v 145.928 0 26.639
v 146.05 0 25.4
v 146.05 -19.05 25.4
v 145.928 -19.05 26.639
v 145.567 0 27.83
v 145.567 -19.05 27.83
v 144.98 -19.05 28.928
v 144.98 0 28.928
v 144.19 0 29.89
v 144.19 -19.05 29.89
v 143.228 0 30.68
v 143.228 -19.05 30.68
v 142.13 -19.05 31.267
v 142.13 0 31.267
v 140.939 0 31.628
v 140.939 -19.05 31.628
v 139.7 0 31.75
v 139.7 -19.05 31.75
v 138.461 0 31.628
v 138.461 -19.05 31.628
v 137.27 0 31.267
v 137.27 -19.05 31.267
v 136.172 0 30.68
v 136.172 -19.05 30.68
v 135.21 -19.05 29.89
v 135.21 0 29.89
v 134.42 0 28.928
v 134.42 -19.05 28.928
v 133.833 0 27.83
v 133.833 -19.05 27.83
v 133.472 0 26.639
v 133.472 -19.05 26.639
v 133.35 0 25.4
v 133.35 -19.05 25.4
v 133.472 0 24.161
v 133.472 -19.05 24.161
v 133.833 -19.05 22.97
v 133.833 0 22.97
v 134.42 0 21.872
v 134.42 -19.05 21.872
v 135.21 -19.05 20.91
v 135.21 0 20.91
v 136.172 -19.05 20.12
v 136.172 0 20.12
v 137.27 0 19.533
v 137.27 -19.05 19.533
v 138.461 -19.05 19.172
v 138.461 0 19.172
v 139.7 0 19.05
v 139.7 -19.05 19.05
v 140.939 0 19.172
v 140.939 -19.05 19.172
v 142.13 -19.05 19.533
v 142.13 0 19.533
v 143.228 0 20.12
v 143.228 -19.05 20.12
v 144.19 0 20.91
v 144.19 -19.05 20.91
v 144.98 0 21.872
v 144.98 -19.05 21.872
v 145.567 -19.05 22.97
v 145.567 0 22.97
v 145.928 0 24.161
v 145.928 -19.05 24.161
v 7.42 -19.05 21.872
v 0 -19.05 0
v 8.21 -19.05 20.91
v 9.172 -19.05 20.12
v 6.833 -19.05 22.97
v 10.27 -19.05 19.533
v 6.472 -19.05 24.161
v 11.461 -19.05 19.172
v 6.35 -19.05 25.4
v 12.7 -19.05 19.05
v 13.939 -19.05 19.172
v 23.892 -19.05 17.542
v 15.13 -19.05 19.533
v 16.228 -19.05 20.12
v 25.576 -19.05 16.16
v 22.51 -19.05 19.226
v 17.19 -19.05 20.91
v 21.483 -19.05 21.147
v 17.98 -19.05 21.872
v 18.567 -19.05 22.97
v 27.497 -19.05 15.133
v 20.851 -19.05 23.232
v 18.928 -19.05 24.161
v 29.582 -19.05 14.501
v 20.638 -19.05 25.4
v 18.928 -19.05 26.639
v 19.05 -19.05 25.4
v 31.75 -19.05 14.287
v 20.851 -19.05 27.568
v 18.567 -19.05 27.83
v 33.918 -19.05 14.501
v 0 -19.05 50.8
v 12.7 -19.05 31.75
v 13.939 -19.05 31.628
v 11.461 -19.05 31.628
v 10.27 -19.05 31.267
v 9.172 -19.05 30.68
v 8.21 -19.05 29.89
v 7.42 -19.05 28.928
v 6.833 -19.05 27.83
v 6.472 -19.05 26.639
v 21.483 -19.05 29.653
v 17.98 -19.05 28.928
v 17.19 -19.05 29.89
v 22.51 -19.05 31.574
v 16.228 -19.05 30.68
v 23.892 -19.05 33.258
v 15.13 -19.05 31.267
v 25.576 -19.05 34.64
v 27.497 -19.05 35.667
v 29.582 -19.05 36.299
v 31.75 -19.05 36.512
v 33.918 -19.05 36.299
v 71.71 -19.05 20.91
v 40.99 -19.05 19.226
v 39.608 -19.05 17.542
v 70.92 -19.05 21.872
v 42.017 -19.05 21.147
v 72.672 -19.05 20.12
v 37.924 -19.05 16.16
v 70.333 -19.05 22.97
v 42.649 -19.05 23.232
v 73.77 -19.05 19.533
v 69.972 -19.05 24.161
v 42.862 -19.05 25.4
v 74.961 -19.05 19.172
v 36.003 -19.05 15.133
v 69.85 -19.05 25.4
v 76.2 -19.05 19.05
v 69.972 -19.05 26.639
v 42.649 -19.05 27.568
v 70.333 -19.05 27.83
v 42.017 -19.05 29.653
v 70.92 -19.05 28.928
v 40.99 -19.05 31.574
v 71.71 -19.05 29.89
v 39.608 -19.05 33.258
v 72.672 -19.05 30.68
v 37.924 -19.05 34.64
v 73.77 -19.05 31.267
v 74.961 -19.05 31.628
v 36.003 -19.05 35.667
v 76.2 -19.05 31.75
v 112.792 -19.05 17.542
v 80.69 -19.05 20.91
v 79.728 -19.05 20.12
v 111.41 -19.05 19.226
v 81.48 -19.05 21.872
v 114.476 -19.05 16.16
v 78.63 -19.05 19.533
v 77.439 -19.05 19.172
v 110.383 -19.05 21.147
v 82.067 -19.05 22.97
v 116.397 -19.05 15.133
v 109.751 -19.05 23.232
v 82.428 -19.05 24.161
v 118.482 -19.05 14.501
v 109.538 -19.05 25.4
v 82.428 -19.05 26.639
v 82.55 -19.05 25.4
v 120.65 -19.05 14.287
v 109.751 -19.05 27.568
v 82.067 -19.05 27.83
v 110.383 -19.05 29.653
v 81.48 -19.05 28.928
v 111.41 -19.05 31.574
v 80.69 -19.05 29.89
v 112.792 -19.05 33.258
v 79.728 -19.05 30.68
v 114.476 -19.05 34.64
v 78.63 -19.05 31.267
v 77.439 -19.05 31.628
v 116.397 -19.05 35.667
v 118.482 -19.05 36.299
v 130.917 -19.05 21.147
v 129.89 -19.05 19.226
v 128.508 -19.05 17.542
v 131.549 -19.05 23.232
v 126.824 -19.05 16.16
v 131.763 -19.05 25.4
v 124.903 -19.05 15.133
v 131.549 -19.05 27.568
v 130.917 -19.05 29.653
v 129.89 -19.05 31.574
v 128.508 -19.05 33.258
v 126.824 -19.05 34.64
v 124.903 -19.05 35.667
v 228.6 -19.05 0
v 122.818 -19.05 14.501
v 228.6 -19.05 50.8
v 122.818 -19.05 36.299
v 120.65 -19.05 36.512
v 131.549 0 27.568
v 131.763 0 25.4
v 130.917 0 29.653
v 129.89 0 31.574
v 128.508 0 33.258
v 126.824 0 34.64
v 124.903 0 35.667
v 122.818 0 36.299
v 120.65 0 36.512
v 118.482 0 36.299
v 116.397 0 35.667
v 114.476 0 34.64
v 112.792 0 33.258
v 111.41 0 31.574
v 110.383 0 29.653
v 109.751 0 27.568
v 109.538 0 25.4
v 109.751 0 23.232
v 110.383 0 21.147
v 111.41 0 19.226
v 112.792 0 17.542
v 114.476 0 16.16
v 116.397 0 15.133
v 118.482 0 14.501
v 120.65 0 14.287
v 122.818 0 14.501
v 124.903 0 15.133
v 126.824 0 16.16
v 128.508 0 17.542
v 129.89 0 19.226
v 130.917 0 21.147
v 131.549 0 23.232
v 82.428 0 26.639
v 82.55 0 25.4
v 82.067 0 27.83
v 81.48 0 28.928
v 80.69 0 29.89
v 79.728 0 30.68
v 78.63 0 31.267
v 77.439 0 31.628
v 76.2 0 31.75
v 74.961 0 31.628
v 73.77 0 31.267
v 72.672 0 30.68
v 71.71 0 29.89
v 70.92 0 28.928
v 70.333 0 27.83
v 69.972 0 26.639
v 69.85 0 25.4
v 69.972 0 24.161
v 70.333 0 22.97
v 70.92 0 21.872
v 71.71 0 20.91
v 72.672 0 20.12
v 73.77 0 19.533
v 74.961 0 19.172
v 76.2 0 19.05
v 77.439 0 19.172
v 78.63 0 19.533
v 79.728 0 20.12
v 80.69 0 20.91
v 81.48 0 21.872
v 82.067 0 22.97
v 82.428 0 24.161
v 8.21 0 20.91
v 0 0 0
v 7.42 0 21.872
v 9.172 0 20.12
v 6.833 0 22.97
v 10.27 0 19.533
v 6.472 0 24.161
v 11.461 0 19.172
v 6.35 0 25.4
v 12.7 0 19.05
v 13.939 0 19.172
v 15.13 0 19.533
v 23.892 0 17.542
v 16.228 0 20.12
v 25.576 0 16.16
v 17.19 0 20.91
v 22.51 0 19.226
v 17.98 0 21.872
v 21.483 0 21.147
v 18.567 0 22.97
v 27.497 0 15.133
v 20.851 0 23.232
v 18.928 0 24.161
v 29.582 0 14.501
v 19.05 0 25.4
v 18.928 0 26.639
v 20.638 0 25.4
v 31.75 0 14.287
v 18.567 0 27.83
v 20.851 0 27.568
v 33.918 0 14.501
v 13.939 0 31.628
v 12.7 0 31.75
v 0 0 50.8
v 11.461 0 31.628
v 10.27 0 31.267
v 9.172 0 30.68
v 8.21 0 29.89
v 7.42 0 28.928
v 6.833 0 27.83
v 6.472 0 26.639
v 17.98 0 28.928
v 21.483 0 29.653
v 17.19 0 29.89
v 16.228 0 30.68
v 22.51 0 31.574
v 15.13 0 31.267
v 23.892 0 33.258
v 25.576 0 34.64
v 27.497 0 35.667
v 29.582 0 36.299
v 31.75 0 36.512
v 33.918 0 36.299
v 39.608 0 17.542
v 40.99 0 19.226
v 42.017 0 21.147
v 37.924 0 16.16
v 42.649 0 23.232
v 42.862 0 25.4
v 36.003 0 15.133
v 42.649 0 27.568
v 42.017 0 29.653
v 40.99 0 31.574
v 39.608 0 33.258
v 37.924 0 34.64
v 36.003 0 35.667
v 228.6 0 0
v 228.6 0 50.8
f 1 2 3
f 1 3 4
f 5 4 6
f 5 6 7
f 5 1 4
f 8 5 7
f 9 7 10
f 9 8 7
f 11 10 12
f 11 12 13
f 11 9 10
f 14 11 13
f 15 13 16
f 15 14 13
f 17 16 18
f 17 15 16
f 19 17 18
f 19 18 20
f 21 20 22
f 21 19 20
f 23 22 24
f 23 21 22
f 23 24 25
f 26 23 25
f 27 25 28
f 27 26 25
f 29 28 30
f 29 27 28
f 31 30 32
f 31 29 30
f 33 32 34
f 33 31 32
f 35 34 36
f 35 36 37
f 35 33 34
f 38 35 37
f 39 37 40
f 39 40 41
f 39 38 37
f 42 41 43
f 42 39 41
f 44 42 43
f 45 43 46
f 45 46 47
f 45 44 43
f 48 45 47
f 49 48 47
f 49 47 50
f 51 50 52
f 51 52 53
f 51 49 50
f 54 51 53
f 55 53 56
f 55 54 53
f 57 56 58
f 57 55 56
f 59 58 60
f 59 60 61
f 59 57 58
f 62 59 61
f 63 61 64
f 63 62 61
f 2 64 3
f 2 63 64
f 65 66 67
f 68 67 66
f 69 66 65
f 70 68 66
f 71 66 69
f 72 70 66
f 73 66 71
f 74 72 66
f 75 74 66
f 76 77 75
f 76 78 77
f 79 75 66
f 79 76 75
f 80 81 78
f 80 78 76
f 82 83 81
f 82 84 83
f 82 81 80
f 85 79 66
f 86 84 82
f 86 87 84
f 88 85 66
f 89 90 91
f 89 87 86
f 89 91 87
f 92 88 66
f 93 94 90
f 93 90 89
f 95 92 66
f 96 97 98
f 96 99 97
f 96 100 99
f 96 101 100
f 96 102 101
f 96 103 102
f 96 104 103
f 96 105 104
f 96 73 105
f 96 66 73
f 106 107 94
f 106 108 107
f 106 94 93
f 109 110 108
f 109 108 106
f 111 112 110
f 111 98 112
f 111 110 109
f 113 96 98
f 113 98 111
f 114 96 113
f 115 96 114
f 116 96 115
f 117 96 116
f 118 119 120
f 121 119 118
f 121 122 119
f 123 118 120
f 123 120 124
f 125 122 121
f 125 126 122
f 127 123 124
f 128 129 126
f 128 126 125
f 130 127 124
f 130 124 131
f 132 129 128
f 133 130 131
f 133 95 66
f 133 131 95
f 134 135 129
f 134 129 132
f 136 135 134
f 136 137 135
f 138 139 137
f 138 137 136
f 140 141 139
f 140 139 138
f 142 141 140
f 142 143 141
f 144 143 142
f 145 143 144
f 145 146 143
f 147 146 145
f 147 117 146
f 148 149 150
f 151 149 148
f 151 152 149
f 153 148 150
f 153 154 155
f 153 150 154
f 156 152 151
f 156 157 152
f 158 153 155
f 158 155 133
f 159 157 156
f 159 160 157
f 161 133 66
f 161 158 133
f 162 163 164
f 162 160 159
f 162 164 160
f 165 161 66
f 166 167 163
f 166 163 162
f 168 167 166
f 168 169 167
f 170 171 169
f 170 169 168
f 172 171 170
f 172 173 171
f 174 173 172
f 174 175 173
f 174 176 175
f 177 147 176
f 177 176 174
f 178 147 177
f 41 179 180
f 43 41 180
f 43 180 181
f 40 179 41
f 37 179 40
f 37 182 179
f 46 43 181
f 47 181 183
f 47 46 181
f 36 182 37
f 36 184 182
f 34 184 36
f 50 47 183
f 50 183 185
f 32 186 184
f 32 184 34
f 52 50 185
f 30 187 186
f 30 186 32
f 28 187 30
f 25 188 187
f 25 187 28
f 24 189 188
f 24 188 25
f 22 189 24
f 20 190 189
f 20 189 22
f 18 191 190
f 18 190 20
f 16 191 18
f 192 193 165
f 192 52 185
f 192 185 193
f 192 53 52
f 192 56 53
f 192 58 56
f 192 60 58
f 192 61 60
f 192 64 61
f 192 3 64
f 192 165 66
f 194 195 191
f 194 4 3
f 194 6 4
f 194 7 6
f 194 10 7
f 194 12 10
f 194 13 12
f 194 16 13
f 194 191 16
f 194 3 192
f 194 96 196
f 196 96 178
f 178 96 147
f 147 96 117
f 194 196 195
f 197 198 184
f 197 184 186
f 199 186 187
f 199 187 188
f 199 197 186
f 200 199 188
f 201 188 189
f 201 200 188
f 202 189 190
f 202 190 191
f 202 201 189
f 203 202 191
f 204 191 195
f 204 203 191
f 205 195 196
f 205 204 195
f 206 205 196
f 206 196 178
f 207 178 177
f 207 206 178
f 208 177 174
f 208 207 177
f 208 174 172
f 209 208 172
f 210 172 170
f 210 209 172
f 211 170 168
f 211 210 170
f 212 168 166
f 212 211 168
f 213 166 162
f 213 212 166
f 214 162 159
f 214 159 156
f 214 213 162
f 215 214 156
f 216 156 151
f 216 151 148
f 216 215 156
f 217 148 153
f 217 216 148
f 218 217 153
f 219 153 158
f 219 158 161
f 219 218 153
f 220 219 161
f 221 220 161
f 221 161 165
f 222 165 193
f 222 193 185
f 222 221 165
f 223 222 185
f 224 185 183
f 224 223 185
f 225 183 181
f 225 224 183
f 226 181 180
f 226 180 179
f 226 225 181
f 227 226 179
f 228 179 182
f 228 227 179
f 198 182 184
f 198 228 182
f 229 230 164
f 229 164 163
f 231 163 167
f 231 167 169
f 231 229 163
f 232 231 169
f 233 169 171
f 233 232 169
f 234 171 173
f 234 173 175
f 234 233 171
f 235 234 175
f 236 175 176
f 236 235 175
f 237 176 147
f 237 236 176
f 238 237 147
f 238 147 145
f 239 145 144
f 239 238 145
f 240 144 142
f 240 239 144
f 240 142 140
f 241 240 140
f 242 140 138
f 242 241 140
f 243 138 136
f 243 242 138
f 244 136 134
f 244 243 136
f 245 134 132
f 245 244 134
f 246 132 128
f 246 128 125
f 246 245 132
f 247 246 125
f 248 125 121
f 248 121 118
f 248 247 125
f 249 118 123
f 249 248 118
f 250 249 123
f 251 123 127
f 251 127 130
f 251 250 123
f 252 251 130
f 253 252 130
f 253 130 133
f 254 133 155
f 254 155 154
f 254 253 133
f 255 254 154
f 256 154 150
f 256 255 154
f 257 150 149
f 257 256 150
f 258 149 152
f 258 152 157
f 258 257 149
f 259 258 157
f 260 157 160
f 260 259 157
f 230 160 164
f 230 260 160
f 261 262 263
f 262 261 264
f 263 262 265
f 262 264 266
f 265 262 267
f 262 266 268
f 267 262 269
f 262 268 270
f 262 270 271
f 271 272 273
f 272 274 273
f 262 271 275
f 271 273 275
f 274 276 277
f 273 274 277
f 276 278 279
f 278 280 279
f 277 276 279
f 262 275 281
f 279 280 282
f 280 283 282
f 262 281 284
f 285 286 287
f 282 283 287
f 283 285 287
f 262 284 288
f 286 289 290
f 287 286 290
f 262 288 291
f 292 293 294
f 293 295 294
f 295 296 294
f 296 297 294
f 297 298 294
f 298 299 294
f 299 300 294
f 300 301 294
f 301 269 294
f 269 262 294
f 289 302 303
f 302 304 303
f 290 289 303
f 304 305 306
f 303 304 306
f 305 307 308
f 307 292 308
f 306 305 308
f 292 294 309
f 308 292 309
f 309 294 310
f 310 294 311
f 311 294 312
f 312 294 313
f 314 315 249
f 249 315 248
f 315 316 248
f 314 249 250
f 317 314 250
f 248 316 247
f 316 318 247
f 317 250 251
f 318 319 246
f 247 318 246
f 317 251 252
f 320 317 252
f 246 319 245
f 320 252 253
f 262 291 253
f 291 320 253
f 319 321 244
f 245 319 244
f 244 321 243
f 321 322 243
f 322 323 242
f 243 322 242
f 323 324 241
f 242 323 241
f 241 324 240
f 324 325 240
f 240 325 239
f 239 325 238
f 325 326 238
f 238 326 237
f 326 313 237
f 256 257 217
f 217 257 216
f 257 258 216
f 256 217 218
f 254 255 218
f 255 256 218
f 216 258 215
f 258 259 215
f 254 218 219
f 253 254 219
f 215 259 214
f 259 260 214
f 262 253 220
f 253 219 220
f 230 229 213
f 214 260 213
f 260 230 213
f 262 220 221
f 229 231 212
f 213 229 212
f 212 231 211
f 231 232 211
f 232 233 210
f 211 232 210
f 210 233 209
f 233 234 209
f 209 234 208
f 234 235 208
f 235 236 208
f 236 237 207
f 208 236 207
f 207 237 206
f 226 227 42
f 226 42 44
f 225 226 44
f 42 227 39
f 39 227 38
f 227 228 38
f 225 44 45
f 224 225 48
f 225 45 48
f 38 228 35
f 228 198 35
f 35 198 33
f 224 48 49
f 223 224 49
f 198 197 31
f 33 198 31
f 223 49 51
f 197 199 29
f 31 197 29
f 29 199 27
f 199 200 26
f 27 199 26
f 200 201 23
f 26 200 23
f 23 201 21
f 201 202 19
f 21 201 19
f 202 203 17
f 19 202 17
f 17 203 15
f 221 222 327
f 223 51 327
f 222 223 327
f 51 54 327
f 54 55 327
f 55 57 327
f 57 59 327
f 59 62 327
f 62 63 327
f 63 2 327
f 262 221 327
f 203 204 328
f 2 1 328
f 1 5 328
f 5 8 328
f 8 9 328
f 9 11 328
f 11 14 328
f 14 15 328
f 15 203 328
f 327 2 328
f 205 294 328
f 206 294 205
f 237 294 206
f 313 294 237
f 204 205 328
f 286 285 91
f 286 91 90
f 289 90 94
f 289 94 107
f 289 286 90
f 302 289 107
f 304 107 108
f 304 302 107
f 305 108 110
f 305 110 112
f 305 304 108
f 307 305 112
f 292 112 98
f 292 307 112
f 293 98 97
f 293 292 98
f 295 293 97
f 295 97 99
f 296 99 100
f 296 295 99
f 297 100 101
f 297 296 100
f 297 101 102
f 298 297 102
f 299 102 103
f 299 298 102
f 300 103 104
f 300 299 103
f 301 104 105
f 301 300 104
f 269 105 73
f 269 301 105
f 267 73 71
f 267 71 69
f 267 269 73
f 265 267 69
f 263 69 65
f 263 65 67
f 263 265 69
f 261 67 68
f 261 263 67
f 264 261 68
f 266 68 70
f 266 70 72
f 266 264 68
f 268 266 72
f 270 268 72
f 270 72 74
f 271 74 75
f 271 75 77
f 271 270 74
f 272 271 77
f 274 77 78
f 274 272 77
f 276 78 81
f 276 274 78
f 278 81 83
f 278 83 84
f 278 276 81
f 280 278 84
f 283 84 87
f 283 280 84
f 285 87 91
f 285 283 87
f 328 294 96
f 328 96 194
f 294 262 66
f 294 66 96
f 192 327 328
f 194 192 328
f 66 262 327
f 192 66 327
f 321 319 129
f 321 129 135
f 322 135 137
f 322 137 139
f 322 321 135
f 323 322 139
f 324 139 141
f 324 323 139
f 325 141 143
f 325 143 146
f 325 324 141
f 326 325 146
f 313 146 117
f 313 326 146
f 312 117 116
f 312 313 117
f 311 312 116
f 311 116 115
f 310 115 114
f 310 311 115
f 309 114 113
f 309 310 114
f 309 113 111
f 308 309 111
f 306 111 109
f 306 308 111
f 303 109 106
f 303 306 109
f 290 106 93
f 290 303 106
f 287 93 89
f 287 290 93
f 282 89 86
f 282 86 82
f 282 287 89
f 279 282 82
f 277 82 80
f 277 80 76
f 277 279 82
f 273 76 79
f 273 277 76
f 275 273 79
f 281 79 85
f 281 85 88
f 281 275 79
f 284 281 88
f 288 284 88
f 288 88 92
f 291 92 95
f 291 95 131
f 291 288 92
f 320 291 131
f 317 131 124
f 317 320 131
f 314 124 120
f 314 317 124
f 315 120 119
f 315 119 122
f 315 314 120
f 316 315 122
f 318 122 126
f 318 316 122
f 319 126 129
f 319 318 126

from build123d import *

# Parameters (mm, degrees)
F0_W     = 228.6
F0_H     = 50.8
F0_R     = 6.35
F0_R_2   = 11.1125
F1_DEPTH = 19.05


with BuildPart() as f1:
    # F0 (on Front) → F1 (new body)
    with BuildSketch(Plane.XZ):
        with Locations((114.3, 25.4)):
            Rectangle(F0_W, F0_H)
        with Locations((12.7, 25.4)):
            Circle(F0_R, mode=Mode.SUBTRACT)
        with Locations((31.75, 25.4)):
            Circle(F0_R_2, mode=Mode.SUBTRACT)
        with Locations((76.2, 25.4)):
            Circle(F0_R, mode=Mode.SUBTRACT)
        with Locations((120.65, 25.4)):
            Circle(F0_R_2, mode=Mode.SUBTRACT)
        with Locations((139.7, 25.4)):
            Circle(F0_R, mode=Mode.SUBTRACT)
    extrude(amount=F1_DEPTH)


solid = f1.part
